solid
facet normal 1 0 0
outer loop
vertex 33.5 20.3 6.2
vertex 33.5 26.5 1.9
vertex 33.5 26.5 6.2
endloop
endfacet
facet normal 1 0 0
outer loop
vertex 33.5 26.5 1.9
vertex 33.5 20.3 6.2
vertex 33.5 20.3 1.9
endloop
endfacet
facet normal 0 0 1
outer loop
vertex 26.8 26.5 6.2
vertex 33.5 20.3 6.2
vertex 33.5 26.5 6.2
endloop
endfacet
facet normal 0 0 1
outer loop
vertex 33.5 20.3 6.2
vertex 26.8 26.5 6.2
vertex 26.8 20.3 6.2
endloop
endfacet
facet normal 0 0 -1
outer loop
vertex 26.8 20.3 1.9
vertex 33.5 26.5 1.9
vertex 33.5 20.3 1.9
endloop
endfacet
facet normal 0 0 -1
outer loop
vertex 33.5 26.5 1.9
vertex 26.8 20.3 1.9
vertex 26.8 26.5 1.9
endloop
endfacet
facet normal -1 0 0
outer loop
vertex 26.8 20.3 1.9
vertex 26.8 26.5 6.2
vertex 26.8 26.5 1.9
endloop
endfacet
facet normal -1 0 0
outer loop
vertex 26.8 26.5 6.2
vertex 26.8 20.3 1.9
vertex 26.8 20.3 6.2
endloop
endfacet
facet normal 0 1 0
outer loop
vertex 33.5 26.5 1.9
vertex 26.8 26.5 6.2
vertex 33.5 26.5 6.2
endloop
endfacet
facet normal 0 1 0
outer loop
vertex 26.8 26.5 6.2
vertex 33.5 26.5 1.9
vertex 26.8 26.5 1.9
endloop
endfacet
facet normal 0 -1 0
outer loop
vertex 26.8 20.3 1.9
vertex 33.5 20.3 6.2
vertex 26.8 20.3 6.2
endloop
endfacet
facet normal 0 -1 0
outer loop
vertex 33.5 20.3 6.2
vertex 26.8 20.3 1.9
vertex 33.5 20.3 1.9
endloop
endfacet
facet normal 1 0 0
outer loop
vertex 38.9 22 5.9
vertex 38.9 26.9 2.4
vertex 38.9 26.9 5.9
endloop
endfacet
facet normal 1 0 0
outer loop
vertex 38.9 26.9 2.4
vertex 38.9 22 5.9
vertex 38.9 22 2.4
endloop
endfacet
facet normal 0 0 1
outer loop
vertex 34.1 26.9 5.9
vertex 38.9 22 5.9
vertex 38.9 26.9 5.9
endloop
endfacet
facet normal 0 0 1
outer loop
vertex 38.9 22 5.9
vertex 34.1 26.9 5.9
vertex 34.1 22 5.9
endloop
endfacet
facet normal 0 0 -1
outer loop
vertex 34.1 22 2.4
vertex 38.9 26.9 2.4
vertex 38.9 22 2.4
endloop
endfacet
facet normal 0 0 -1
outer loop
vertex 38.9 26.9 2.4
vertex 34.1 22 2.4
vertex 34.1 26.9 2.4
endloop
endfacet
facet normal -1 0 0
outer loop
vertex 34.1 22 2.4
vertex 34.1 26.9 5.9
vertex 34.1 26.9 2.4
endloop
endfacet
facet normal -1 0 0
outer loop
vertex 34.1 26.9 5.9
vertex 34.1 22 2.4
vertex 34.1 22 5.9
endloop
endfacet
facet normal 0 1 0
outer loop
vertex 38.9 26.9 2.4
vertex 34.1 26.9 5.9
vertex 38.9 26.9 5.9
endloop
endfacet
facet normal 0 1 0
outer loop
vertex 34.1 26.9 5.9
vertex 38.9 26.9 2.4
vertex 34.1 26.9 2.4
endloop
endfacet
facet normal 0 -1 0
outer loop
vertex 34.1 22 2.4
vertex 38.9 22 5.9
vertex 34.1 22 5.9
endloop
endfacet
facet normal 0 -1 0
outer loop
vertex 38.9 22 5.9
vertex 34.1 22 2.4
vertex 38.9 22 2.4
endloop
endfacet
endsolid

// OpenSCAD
union() {
  translate([26.8, 20.3, 1.9]) cube(size=[6.7,6.2,4.3], center=false);
  translate([34.1, 22.0, 2.4]) cube(size=[4.8,4.9,3.5], center=false);
}
